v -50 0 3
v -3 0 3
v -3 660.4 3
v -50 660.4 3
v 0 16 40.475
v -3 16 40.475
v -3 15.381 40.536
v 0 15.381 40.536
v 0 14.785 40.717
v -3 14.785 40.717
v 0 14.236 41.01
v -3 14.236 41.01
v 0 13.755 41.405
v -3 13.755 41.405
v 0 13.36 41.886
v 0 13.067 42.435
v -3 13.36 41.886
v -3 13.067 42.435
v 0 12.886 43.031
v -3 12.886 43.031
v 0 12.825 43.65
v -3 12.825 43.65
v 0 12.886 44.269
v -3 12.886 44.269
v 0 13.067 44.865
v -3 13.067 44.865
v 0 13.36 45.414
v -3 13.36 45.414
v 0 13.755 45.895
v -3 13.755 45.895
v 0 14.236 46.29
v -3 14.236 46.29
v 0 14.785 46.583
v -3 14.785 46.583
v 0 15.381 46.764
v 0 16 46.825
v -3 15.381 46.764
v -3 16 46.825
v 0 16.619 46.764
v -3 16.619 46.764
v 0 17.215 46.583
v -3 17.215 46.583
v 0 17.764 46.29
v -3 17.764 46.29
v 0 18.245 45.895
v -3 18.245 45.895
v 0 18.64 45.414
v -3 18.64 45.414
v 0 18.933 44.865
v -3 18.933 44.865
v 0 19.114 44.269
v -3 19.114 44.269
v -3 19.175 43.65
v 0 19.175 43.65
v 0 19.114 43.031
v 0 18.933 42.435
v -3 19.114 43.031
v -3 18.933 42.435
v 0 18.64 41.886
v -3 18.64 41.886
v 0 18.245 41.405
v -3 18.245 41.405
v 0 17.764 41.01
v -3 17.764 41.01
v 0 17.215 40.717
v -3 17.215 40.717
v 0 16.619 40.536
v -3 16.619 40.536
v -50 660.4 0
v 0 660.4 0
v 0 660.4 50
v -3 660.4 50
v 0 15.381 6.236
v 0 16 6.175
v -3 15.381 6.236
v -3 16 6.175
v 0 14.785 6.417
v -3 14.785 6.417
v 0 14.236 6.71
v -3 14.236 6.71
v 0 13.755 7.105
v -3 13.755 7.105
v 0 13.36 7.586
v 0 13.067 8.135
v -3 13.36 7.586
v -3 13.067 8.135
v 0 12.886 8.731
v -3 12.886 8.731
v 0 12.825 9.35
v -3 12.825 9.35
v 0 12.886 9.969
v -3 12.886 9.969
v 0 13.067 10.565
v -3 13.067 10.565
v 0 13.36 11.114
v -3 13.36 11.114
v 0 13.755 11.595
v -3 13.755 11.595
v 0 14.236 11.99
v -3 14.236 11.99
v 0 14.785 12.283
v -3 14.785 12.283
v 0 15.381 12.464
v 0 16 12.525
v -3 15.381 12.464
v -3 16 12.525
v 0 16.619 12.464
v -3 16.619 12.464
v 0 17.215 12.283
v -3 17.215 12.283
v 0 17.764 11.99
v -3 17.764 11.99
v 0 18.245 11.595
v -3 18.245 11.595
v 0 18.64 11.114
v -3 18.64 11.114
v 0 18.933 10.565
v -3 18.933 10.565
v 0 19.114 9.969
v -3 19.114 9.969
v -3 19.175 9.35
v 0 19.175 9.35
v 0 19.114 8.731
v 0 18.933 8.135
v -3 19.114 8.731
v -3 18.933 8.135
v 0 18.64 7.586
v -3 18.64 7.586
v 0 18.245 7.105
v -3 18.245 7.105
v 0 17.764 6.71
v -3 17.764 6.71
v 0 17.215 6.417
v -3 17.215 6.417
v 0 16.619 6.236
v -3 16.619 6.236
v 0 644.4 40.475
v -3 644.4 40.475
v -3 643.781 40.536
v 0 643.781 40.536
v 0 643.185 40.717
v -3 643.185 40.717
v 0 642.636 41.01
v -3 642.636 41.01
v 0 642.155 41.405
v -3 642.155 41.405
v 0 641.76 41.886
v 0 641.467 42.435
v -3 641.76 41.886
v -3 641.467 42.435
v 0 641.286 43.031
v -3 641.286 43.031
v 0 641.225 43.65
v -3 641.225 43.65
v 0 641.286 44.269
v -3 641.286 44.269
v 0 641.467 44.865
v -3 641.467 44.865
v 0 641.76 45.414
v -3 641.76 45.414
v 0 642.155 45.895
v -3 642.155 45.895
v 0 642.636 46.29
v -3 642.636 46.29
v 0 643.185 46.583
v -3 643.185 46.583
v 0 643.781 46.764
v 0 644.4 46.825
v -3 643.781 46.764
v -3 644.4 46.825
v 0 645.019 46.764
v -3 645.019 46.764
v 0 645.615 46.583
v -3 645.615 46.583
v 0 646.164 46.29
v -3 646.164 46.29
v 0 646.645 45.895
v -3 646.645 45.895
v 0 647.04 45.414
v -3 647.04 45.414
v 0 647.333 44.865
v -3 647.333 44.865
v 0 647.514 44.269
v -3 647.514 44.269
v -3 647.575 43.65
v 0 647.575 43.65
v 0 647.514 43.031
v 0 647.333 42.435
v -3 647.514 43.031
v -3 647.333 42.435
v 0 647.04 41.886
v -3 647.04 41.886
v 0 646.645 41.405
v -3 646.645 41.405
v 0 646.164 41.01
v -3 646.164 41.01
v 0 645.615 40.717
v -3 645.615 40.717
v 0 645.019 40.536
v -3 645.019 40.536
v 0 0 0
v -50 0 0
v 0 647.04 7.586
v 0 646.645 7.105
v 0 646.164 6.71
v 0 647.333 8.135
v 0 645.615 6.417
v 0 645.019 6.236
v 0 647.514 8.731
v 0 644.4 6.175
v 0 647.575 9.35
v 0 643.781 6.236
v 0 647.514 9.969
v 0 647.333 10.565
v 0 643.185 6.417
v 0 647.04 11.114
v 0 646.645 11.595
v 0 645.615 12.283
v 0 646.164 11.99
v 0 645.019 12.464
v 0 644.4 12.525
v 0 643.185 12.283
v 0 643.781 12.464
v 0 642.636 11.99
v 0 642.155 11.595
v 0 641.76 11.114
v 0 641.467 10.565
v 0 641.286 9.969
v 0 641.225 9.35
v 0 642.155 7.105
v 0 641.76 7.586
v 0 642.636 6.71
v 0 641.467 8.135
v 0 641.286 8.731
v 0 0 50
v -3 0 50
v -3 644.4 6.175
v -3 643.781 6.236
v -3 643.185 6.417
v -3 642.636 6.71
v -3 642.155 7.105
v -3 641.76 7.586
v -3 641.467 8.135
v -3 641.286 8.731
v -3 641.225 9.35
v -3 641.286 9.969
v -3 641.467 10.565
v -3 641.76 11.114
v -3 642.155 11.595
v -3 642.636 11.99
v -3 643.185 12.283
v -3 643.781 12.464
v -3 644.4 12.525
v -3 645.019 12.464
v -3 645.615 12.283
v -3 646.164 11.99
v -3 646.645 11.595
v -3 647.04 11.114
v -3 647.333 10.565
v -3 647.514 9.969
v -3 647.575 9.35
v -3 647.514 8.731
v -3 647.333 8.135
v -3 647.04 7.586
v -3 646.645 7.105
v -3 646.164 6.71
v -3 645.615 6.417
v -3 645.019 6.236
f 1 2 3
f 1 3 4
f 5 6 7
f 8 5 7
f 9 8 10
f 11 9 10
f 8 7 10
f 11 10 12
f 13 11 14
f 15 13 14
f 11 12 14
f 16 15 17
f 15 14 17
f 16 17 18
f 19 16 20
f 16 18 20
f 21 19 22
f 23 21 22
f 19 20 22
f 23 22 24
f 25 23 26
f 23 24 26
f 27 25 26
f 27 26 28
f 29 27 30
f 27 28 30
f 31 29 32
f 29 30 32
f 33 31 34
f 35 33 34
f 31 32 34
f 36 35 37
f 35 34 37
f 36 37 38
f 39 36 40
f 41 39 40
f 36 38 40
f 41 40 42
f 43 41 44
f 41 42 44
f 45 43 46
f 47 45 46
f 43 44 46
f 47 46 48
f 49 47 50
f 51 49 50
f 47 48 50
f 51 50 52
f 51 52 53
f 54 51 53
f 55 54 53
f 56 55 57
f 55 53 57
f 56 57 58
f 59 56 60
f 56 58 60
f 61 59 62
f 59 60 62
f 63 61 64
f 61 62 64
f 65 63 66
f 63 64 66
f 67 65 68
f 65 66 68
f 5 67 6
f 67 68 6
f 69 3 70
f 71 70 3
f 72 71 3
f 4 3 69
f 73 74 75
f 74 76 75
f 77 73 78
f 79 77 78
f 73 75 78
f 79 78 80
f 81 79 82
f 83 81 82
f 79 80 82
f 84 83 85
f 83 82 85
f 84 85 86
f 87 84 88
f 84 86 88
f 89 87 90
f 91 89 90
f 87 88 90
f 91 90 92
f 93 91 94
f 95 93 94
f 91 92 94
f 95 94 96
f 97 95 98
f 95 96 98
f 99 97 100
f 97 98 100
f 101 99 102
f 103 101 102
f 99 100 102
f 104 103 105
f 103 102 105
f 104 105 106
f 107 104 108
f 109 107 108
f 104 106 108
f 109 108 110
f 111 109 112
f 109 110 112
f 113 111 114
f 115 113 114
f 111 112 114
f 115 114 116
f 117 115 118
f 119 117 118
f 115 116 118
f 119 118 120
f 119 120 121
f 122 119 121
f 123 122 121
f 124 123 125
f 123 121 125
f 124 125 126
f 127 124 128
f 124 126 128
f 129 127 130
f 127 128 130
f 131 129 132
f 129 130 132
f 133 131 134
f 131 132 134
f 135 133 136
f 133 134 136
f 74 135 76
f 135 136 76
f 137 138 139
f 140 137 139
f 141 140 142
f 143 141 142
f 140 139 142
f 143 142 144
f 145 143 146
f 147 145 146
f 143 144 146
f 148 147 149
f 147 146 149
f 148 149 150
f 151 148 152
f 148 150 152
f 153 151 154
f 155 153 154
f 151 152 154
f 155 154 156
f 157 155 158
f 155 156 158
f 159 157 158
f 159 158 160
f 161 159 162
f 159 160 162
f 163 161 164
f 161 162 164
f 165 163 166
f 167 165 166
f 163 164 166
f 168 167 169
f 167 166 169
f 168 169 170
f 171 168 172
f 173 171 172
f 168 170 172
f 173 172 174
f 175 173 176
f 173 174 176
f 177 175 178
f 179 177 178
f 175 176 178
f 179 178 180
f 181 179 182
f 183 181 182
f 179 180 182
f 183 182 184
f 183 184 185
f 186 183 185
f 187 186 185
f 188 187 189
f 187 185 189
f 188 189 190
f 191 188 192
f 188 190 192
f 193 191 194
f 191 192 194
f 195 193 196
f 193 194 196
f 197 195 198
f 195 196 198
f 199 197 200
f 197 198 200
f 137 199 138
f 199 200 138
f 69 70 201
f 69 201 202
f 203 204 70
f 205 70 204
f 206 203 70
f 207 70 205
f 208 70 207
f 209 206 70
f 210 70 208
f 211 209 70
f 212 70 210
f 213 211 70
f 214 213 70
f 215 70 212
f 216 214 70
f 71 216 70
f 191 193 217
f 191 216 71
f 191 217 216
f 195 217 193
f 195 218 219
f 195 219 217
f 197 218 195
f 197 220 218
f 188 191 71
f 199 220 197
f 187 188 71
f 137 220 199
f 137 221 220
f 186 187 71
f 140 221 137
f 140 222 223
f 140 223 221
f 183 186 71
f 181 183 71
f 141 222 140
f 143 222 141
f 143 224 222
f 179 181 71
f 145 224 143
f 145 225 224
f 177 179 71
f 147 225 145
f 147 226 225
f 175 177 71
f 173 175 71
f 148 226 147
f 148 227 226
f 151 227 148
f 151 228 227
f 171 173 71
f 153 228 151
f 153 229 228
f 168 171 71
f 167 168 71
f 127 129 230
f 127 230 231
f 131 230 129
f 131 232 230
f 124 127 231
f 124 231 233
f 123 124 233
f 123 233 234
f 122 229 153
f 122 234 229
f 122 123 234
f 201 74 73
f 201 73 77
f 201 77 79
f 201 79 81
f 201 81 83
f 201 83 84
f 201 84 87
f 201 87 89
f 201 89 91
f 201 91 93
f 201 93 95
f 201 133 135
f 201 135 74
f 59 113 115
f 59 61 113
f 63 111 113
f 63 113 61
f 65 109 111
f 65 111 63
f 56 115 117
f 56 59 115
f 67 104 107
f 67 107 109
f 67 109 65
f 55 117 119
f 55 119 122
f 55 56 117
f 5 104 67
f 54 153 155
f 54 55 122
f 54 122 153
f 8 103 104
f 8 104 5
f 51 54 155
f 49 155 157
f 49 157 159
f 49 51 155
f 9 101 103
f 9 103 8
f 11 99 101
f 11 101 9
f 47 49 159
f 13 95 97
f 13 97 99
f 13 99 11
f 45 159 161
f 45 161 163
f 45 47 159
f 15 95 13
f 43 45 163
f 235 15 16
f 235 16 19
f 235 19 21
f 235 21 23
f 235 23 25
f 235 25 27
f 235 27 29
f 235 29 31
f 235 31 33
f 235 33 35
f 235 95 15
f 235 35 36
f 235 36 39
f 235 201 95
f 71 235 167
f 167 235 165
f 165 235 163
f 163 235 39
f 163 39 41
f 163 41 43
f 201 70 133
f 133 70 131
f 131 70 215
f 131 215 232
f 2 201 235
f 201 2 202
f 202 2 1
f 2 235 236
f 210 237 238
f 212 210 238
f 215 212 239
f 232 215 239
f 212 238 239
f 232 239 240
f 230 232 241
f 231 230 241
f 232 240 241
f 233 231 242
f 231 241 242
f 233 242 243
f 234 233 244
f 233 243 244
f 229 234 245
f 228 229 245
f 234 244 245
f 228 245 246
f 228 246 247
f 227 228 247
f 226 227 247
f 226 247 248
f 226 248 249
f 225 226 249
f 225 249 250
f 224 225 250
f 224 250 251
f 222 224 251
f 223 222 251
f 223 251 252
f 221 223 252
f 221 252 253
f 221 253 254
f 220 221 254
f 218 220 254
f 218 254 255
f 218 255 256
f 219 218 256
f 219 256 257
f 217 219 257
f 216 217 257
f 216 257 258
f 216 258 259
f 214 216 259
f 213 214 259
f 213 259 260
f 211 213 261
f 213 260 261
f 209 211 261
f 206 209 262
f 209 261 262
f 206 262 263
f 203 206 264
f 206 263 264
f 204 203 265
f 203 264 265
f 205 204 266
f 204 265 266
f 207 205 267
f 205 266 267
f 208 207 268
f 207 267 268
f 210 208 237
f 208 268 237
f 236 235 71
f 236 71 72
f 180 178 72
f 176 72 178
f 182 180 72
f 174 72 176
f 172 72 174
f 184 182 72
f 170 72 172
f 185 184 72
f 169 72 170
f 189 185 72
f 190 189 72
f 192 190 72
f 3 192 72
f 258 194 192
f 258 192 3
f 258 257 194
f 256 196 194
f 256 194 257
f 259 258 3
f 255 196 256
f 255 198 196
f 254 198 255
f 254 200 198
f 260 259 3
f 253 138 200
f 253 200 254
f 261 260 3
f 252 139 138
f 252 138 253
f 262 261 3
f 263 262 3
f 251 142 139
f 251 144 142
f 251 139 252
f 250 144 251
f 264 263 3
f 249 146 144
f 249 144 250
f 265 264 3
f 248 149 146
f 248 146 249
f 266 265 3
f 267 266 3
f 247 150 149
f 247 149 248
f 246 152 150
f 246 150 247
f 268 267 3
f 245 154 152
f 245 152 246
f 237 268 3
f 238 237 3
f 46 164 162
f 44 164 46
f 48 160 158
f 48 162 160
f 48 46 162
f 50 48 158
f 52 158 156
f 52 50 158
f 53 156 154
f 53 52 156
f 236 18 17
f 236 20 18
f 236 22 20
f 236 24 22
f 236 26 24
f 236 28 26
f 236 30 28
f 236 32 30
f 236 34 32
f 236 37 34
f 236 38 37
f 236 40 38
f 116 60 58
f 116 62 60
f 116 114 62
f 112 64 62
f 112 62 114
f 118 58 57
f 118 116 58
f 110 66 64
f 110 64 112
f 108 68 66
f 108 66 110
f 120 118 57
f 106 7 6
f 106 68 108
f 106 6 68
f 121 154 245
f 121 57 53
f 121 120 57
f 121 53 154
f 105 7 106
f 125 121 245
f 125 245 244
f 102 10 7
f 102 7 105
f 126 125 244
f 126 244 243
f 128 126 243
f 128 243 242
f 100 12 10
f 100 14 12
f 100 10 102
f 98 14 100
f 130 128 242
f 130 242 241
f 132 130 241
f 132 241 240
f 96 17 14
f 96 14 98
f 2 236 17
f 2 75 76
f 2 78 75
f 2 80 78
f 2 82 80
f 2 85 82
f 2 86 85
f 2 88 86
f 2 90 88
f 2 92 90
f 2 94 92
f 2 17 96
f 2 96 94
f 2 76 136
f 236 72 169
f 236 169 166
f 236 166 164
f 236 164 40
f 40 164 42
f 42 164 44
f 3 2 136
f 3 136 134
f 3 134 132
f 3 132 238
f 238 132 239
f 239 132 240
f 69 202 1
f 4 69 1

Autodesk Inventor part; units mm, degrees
ref_plane "YZ Plane" through (0, 0, 0) normal (1, 0, 0) x (0, 1, 0)
ref_plane "XZ Plane" through (0, 0, 0) normal (0, 1, 0) x (-1, 0, 0)
ref_plane "XY Plane" through (0, 0, 0) normal (0, 0, 1) x (1, 0, 0)
sketch "Sketch1" plane through (0, 0, 0) normal (0, 1, 0) x (-1, 0, 0)
  line L0 (0, 0) -> (50, 0)
  line L1 (50, 0) -> (50, 3)
  line L2 (0, 0) -> (0, 50)
  line L3 (0, 50) -> (3, 50)
  line L4 (3, 50) -> (3, 3)
  line L5 (3, 3) -> (50, 3)
  dimension "d0" = 50
  dimension "d1" = 3
  dimension "d2" = 50
  dimension "d3" = 3
extrude "Extrusion1" add sketch "Sketch1" along normal blind 660.4
sketch "Sketch7" plane through (0, 0, 50) normal (1, 0, 0) x (0, 0, -1)
  line L0 (0, 0) -> (50, 0) projected
  line L1 (50, 0) -> (50, 660.4) projected
  line L2 (0, 660.4) -> (50, 660.4) projected
  line L3 (0, 0) -> (0, 660.4) projected
  circle A0 centre (6.35, 16) radius 3.175
  circle A1 centre (40.65, 16) radius 3.175
  circle A2 centre (6.35, 644.4) radius 3.175
  circle A3 centre (40.65, 644.4) radius 3.175
  line L4 (47, 0) -> (47, 660.4) construction
  dimension "d80" = 16
  dimension "d82" = 6.35
  dimension "d83" = 6.35
  dimension "d84" = 6.35
  dimension "d85" = 6.35
  dimension "d86" = 6.35
  dimension "d88" = 6.35
  dimension "d89" = 16
  dimension "d97" = 3
  dimension "d98" = 6.35
hole "Hole1" at (0, 16, 43.65) at (0, 16, 9.35) at (0, 644.4, 43.65) at (0, 644.4, 9.35) direction (-1, 0, 0) diameter 6.35 depth 3 tip angle 118
equation "\"d84\" = d83"
equation "\"d85\" = d83"
equation "\"d86\" = d83"
properties part number "26in Angle Channel CIM Mount Right" material "Aluminum 6061"
